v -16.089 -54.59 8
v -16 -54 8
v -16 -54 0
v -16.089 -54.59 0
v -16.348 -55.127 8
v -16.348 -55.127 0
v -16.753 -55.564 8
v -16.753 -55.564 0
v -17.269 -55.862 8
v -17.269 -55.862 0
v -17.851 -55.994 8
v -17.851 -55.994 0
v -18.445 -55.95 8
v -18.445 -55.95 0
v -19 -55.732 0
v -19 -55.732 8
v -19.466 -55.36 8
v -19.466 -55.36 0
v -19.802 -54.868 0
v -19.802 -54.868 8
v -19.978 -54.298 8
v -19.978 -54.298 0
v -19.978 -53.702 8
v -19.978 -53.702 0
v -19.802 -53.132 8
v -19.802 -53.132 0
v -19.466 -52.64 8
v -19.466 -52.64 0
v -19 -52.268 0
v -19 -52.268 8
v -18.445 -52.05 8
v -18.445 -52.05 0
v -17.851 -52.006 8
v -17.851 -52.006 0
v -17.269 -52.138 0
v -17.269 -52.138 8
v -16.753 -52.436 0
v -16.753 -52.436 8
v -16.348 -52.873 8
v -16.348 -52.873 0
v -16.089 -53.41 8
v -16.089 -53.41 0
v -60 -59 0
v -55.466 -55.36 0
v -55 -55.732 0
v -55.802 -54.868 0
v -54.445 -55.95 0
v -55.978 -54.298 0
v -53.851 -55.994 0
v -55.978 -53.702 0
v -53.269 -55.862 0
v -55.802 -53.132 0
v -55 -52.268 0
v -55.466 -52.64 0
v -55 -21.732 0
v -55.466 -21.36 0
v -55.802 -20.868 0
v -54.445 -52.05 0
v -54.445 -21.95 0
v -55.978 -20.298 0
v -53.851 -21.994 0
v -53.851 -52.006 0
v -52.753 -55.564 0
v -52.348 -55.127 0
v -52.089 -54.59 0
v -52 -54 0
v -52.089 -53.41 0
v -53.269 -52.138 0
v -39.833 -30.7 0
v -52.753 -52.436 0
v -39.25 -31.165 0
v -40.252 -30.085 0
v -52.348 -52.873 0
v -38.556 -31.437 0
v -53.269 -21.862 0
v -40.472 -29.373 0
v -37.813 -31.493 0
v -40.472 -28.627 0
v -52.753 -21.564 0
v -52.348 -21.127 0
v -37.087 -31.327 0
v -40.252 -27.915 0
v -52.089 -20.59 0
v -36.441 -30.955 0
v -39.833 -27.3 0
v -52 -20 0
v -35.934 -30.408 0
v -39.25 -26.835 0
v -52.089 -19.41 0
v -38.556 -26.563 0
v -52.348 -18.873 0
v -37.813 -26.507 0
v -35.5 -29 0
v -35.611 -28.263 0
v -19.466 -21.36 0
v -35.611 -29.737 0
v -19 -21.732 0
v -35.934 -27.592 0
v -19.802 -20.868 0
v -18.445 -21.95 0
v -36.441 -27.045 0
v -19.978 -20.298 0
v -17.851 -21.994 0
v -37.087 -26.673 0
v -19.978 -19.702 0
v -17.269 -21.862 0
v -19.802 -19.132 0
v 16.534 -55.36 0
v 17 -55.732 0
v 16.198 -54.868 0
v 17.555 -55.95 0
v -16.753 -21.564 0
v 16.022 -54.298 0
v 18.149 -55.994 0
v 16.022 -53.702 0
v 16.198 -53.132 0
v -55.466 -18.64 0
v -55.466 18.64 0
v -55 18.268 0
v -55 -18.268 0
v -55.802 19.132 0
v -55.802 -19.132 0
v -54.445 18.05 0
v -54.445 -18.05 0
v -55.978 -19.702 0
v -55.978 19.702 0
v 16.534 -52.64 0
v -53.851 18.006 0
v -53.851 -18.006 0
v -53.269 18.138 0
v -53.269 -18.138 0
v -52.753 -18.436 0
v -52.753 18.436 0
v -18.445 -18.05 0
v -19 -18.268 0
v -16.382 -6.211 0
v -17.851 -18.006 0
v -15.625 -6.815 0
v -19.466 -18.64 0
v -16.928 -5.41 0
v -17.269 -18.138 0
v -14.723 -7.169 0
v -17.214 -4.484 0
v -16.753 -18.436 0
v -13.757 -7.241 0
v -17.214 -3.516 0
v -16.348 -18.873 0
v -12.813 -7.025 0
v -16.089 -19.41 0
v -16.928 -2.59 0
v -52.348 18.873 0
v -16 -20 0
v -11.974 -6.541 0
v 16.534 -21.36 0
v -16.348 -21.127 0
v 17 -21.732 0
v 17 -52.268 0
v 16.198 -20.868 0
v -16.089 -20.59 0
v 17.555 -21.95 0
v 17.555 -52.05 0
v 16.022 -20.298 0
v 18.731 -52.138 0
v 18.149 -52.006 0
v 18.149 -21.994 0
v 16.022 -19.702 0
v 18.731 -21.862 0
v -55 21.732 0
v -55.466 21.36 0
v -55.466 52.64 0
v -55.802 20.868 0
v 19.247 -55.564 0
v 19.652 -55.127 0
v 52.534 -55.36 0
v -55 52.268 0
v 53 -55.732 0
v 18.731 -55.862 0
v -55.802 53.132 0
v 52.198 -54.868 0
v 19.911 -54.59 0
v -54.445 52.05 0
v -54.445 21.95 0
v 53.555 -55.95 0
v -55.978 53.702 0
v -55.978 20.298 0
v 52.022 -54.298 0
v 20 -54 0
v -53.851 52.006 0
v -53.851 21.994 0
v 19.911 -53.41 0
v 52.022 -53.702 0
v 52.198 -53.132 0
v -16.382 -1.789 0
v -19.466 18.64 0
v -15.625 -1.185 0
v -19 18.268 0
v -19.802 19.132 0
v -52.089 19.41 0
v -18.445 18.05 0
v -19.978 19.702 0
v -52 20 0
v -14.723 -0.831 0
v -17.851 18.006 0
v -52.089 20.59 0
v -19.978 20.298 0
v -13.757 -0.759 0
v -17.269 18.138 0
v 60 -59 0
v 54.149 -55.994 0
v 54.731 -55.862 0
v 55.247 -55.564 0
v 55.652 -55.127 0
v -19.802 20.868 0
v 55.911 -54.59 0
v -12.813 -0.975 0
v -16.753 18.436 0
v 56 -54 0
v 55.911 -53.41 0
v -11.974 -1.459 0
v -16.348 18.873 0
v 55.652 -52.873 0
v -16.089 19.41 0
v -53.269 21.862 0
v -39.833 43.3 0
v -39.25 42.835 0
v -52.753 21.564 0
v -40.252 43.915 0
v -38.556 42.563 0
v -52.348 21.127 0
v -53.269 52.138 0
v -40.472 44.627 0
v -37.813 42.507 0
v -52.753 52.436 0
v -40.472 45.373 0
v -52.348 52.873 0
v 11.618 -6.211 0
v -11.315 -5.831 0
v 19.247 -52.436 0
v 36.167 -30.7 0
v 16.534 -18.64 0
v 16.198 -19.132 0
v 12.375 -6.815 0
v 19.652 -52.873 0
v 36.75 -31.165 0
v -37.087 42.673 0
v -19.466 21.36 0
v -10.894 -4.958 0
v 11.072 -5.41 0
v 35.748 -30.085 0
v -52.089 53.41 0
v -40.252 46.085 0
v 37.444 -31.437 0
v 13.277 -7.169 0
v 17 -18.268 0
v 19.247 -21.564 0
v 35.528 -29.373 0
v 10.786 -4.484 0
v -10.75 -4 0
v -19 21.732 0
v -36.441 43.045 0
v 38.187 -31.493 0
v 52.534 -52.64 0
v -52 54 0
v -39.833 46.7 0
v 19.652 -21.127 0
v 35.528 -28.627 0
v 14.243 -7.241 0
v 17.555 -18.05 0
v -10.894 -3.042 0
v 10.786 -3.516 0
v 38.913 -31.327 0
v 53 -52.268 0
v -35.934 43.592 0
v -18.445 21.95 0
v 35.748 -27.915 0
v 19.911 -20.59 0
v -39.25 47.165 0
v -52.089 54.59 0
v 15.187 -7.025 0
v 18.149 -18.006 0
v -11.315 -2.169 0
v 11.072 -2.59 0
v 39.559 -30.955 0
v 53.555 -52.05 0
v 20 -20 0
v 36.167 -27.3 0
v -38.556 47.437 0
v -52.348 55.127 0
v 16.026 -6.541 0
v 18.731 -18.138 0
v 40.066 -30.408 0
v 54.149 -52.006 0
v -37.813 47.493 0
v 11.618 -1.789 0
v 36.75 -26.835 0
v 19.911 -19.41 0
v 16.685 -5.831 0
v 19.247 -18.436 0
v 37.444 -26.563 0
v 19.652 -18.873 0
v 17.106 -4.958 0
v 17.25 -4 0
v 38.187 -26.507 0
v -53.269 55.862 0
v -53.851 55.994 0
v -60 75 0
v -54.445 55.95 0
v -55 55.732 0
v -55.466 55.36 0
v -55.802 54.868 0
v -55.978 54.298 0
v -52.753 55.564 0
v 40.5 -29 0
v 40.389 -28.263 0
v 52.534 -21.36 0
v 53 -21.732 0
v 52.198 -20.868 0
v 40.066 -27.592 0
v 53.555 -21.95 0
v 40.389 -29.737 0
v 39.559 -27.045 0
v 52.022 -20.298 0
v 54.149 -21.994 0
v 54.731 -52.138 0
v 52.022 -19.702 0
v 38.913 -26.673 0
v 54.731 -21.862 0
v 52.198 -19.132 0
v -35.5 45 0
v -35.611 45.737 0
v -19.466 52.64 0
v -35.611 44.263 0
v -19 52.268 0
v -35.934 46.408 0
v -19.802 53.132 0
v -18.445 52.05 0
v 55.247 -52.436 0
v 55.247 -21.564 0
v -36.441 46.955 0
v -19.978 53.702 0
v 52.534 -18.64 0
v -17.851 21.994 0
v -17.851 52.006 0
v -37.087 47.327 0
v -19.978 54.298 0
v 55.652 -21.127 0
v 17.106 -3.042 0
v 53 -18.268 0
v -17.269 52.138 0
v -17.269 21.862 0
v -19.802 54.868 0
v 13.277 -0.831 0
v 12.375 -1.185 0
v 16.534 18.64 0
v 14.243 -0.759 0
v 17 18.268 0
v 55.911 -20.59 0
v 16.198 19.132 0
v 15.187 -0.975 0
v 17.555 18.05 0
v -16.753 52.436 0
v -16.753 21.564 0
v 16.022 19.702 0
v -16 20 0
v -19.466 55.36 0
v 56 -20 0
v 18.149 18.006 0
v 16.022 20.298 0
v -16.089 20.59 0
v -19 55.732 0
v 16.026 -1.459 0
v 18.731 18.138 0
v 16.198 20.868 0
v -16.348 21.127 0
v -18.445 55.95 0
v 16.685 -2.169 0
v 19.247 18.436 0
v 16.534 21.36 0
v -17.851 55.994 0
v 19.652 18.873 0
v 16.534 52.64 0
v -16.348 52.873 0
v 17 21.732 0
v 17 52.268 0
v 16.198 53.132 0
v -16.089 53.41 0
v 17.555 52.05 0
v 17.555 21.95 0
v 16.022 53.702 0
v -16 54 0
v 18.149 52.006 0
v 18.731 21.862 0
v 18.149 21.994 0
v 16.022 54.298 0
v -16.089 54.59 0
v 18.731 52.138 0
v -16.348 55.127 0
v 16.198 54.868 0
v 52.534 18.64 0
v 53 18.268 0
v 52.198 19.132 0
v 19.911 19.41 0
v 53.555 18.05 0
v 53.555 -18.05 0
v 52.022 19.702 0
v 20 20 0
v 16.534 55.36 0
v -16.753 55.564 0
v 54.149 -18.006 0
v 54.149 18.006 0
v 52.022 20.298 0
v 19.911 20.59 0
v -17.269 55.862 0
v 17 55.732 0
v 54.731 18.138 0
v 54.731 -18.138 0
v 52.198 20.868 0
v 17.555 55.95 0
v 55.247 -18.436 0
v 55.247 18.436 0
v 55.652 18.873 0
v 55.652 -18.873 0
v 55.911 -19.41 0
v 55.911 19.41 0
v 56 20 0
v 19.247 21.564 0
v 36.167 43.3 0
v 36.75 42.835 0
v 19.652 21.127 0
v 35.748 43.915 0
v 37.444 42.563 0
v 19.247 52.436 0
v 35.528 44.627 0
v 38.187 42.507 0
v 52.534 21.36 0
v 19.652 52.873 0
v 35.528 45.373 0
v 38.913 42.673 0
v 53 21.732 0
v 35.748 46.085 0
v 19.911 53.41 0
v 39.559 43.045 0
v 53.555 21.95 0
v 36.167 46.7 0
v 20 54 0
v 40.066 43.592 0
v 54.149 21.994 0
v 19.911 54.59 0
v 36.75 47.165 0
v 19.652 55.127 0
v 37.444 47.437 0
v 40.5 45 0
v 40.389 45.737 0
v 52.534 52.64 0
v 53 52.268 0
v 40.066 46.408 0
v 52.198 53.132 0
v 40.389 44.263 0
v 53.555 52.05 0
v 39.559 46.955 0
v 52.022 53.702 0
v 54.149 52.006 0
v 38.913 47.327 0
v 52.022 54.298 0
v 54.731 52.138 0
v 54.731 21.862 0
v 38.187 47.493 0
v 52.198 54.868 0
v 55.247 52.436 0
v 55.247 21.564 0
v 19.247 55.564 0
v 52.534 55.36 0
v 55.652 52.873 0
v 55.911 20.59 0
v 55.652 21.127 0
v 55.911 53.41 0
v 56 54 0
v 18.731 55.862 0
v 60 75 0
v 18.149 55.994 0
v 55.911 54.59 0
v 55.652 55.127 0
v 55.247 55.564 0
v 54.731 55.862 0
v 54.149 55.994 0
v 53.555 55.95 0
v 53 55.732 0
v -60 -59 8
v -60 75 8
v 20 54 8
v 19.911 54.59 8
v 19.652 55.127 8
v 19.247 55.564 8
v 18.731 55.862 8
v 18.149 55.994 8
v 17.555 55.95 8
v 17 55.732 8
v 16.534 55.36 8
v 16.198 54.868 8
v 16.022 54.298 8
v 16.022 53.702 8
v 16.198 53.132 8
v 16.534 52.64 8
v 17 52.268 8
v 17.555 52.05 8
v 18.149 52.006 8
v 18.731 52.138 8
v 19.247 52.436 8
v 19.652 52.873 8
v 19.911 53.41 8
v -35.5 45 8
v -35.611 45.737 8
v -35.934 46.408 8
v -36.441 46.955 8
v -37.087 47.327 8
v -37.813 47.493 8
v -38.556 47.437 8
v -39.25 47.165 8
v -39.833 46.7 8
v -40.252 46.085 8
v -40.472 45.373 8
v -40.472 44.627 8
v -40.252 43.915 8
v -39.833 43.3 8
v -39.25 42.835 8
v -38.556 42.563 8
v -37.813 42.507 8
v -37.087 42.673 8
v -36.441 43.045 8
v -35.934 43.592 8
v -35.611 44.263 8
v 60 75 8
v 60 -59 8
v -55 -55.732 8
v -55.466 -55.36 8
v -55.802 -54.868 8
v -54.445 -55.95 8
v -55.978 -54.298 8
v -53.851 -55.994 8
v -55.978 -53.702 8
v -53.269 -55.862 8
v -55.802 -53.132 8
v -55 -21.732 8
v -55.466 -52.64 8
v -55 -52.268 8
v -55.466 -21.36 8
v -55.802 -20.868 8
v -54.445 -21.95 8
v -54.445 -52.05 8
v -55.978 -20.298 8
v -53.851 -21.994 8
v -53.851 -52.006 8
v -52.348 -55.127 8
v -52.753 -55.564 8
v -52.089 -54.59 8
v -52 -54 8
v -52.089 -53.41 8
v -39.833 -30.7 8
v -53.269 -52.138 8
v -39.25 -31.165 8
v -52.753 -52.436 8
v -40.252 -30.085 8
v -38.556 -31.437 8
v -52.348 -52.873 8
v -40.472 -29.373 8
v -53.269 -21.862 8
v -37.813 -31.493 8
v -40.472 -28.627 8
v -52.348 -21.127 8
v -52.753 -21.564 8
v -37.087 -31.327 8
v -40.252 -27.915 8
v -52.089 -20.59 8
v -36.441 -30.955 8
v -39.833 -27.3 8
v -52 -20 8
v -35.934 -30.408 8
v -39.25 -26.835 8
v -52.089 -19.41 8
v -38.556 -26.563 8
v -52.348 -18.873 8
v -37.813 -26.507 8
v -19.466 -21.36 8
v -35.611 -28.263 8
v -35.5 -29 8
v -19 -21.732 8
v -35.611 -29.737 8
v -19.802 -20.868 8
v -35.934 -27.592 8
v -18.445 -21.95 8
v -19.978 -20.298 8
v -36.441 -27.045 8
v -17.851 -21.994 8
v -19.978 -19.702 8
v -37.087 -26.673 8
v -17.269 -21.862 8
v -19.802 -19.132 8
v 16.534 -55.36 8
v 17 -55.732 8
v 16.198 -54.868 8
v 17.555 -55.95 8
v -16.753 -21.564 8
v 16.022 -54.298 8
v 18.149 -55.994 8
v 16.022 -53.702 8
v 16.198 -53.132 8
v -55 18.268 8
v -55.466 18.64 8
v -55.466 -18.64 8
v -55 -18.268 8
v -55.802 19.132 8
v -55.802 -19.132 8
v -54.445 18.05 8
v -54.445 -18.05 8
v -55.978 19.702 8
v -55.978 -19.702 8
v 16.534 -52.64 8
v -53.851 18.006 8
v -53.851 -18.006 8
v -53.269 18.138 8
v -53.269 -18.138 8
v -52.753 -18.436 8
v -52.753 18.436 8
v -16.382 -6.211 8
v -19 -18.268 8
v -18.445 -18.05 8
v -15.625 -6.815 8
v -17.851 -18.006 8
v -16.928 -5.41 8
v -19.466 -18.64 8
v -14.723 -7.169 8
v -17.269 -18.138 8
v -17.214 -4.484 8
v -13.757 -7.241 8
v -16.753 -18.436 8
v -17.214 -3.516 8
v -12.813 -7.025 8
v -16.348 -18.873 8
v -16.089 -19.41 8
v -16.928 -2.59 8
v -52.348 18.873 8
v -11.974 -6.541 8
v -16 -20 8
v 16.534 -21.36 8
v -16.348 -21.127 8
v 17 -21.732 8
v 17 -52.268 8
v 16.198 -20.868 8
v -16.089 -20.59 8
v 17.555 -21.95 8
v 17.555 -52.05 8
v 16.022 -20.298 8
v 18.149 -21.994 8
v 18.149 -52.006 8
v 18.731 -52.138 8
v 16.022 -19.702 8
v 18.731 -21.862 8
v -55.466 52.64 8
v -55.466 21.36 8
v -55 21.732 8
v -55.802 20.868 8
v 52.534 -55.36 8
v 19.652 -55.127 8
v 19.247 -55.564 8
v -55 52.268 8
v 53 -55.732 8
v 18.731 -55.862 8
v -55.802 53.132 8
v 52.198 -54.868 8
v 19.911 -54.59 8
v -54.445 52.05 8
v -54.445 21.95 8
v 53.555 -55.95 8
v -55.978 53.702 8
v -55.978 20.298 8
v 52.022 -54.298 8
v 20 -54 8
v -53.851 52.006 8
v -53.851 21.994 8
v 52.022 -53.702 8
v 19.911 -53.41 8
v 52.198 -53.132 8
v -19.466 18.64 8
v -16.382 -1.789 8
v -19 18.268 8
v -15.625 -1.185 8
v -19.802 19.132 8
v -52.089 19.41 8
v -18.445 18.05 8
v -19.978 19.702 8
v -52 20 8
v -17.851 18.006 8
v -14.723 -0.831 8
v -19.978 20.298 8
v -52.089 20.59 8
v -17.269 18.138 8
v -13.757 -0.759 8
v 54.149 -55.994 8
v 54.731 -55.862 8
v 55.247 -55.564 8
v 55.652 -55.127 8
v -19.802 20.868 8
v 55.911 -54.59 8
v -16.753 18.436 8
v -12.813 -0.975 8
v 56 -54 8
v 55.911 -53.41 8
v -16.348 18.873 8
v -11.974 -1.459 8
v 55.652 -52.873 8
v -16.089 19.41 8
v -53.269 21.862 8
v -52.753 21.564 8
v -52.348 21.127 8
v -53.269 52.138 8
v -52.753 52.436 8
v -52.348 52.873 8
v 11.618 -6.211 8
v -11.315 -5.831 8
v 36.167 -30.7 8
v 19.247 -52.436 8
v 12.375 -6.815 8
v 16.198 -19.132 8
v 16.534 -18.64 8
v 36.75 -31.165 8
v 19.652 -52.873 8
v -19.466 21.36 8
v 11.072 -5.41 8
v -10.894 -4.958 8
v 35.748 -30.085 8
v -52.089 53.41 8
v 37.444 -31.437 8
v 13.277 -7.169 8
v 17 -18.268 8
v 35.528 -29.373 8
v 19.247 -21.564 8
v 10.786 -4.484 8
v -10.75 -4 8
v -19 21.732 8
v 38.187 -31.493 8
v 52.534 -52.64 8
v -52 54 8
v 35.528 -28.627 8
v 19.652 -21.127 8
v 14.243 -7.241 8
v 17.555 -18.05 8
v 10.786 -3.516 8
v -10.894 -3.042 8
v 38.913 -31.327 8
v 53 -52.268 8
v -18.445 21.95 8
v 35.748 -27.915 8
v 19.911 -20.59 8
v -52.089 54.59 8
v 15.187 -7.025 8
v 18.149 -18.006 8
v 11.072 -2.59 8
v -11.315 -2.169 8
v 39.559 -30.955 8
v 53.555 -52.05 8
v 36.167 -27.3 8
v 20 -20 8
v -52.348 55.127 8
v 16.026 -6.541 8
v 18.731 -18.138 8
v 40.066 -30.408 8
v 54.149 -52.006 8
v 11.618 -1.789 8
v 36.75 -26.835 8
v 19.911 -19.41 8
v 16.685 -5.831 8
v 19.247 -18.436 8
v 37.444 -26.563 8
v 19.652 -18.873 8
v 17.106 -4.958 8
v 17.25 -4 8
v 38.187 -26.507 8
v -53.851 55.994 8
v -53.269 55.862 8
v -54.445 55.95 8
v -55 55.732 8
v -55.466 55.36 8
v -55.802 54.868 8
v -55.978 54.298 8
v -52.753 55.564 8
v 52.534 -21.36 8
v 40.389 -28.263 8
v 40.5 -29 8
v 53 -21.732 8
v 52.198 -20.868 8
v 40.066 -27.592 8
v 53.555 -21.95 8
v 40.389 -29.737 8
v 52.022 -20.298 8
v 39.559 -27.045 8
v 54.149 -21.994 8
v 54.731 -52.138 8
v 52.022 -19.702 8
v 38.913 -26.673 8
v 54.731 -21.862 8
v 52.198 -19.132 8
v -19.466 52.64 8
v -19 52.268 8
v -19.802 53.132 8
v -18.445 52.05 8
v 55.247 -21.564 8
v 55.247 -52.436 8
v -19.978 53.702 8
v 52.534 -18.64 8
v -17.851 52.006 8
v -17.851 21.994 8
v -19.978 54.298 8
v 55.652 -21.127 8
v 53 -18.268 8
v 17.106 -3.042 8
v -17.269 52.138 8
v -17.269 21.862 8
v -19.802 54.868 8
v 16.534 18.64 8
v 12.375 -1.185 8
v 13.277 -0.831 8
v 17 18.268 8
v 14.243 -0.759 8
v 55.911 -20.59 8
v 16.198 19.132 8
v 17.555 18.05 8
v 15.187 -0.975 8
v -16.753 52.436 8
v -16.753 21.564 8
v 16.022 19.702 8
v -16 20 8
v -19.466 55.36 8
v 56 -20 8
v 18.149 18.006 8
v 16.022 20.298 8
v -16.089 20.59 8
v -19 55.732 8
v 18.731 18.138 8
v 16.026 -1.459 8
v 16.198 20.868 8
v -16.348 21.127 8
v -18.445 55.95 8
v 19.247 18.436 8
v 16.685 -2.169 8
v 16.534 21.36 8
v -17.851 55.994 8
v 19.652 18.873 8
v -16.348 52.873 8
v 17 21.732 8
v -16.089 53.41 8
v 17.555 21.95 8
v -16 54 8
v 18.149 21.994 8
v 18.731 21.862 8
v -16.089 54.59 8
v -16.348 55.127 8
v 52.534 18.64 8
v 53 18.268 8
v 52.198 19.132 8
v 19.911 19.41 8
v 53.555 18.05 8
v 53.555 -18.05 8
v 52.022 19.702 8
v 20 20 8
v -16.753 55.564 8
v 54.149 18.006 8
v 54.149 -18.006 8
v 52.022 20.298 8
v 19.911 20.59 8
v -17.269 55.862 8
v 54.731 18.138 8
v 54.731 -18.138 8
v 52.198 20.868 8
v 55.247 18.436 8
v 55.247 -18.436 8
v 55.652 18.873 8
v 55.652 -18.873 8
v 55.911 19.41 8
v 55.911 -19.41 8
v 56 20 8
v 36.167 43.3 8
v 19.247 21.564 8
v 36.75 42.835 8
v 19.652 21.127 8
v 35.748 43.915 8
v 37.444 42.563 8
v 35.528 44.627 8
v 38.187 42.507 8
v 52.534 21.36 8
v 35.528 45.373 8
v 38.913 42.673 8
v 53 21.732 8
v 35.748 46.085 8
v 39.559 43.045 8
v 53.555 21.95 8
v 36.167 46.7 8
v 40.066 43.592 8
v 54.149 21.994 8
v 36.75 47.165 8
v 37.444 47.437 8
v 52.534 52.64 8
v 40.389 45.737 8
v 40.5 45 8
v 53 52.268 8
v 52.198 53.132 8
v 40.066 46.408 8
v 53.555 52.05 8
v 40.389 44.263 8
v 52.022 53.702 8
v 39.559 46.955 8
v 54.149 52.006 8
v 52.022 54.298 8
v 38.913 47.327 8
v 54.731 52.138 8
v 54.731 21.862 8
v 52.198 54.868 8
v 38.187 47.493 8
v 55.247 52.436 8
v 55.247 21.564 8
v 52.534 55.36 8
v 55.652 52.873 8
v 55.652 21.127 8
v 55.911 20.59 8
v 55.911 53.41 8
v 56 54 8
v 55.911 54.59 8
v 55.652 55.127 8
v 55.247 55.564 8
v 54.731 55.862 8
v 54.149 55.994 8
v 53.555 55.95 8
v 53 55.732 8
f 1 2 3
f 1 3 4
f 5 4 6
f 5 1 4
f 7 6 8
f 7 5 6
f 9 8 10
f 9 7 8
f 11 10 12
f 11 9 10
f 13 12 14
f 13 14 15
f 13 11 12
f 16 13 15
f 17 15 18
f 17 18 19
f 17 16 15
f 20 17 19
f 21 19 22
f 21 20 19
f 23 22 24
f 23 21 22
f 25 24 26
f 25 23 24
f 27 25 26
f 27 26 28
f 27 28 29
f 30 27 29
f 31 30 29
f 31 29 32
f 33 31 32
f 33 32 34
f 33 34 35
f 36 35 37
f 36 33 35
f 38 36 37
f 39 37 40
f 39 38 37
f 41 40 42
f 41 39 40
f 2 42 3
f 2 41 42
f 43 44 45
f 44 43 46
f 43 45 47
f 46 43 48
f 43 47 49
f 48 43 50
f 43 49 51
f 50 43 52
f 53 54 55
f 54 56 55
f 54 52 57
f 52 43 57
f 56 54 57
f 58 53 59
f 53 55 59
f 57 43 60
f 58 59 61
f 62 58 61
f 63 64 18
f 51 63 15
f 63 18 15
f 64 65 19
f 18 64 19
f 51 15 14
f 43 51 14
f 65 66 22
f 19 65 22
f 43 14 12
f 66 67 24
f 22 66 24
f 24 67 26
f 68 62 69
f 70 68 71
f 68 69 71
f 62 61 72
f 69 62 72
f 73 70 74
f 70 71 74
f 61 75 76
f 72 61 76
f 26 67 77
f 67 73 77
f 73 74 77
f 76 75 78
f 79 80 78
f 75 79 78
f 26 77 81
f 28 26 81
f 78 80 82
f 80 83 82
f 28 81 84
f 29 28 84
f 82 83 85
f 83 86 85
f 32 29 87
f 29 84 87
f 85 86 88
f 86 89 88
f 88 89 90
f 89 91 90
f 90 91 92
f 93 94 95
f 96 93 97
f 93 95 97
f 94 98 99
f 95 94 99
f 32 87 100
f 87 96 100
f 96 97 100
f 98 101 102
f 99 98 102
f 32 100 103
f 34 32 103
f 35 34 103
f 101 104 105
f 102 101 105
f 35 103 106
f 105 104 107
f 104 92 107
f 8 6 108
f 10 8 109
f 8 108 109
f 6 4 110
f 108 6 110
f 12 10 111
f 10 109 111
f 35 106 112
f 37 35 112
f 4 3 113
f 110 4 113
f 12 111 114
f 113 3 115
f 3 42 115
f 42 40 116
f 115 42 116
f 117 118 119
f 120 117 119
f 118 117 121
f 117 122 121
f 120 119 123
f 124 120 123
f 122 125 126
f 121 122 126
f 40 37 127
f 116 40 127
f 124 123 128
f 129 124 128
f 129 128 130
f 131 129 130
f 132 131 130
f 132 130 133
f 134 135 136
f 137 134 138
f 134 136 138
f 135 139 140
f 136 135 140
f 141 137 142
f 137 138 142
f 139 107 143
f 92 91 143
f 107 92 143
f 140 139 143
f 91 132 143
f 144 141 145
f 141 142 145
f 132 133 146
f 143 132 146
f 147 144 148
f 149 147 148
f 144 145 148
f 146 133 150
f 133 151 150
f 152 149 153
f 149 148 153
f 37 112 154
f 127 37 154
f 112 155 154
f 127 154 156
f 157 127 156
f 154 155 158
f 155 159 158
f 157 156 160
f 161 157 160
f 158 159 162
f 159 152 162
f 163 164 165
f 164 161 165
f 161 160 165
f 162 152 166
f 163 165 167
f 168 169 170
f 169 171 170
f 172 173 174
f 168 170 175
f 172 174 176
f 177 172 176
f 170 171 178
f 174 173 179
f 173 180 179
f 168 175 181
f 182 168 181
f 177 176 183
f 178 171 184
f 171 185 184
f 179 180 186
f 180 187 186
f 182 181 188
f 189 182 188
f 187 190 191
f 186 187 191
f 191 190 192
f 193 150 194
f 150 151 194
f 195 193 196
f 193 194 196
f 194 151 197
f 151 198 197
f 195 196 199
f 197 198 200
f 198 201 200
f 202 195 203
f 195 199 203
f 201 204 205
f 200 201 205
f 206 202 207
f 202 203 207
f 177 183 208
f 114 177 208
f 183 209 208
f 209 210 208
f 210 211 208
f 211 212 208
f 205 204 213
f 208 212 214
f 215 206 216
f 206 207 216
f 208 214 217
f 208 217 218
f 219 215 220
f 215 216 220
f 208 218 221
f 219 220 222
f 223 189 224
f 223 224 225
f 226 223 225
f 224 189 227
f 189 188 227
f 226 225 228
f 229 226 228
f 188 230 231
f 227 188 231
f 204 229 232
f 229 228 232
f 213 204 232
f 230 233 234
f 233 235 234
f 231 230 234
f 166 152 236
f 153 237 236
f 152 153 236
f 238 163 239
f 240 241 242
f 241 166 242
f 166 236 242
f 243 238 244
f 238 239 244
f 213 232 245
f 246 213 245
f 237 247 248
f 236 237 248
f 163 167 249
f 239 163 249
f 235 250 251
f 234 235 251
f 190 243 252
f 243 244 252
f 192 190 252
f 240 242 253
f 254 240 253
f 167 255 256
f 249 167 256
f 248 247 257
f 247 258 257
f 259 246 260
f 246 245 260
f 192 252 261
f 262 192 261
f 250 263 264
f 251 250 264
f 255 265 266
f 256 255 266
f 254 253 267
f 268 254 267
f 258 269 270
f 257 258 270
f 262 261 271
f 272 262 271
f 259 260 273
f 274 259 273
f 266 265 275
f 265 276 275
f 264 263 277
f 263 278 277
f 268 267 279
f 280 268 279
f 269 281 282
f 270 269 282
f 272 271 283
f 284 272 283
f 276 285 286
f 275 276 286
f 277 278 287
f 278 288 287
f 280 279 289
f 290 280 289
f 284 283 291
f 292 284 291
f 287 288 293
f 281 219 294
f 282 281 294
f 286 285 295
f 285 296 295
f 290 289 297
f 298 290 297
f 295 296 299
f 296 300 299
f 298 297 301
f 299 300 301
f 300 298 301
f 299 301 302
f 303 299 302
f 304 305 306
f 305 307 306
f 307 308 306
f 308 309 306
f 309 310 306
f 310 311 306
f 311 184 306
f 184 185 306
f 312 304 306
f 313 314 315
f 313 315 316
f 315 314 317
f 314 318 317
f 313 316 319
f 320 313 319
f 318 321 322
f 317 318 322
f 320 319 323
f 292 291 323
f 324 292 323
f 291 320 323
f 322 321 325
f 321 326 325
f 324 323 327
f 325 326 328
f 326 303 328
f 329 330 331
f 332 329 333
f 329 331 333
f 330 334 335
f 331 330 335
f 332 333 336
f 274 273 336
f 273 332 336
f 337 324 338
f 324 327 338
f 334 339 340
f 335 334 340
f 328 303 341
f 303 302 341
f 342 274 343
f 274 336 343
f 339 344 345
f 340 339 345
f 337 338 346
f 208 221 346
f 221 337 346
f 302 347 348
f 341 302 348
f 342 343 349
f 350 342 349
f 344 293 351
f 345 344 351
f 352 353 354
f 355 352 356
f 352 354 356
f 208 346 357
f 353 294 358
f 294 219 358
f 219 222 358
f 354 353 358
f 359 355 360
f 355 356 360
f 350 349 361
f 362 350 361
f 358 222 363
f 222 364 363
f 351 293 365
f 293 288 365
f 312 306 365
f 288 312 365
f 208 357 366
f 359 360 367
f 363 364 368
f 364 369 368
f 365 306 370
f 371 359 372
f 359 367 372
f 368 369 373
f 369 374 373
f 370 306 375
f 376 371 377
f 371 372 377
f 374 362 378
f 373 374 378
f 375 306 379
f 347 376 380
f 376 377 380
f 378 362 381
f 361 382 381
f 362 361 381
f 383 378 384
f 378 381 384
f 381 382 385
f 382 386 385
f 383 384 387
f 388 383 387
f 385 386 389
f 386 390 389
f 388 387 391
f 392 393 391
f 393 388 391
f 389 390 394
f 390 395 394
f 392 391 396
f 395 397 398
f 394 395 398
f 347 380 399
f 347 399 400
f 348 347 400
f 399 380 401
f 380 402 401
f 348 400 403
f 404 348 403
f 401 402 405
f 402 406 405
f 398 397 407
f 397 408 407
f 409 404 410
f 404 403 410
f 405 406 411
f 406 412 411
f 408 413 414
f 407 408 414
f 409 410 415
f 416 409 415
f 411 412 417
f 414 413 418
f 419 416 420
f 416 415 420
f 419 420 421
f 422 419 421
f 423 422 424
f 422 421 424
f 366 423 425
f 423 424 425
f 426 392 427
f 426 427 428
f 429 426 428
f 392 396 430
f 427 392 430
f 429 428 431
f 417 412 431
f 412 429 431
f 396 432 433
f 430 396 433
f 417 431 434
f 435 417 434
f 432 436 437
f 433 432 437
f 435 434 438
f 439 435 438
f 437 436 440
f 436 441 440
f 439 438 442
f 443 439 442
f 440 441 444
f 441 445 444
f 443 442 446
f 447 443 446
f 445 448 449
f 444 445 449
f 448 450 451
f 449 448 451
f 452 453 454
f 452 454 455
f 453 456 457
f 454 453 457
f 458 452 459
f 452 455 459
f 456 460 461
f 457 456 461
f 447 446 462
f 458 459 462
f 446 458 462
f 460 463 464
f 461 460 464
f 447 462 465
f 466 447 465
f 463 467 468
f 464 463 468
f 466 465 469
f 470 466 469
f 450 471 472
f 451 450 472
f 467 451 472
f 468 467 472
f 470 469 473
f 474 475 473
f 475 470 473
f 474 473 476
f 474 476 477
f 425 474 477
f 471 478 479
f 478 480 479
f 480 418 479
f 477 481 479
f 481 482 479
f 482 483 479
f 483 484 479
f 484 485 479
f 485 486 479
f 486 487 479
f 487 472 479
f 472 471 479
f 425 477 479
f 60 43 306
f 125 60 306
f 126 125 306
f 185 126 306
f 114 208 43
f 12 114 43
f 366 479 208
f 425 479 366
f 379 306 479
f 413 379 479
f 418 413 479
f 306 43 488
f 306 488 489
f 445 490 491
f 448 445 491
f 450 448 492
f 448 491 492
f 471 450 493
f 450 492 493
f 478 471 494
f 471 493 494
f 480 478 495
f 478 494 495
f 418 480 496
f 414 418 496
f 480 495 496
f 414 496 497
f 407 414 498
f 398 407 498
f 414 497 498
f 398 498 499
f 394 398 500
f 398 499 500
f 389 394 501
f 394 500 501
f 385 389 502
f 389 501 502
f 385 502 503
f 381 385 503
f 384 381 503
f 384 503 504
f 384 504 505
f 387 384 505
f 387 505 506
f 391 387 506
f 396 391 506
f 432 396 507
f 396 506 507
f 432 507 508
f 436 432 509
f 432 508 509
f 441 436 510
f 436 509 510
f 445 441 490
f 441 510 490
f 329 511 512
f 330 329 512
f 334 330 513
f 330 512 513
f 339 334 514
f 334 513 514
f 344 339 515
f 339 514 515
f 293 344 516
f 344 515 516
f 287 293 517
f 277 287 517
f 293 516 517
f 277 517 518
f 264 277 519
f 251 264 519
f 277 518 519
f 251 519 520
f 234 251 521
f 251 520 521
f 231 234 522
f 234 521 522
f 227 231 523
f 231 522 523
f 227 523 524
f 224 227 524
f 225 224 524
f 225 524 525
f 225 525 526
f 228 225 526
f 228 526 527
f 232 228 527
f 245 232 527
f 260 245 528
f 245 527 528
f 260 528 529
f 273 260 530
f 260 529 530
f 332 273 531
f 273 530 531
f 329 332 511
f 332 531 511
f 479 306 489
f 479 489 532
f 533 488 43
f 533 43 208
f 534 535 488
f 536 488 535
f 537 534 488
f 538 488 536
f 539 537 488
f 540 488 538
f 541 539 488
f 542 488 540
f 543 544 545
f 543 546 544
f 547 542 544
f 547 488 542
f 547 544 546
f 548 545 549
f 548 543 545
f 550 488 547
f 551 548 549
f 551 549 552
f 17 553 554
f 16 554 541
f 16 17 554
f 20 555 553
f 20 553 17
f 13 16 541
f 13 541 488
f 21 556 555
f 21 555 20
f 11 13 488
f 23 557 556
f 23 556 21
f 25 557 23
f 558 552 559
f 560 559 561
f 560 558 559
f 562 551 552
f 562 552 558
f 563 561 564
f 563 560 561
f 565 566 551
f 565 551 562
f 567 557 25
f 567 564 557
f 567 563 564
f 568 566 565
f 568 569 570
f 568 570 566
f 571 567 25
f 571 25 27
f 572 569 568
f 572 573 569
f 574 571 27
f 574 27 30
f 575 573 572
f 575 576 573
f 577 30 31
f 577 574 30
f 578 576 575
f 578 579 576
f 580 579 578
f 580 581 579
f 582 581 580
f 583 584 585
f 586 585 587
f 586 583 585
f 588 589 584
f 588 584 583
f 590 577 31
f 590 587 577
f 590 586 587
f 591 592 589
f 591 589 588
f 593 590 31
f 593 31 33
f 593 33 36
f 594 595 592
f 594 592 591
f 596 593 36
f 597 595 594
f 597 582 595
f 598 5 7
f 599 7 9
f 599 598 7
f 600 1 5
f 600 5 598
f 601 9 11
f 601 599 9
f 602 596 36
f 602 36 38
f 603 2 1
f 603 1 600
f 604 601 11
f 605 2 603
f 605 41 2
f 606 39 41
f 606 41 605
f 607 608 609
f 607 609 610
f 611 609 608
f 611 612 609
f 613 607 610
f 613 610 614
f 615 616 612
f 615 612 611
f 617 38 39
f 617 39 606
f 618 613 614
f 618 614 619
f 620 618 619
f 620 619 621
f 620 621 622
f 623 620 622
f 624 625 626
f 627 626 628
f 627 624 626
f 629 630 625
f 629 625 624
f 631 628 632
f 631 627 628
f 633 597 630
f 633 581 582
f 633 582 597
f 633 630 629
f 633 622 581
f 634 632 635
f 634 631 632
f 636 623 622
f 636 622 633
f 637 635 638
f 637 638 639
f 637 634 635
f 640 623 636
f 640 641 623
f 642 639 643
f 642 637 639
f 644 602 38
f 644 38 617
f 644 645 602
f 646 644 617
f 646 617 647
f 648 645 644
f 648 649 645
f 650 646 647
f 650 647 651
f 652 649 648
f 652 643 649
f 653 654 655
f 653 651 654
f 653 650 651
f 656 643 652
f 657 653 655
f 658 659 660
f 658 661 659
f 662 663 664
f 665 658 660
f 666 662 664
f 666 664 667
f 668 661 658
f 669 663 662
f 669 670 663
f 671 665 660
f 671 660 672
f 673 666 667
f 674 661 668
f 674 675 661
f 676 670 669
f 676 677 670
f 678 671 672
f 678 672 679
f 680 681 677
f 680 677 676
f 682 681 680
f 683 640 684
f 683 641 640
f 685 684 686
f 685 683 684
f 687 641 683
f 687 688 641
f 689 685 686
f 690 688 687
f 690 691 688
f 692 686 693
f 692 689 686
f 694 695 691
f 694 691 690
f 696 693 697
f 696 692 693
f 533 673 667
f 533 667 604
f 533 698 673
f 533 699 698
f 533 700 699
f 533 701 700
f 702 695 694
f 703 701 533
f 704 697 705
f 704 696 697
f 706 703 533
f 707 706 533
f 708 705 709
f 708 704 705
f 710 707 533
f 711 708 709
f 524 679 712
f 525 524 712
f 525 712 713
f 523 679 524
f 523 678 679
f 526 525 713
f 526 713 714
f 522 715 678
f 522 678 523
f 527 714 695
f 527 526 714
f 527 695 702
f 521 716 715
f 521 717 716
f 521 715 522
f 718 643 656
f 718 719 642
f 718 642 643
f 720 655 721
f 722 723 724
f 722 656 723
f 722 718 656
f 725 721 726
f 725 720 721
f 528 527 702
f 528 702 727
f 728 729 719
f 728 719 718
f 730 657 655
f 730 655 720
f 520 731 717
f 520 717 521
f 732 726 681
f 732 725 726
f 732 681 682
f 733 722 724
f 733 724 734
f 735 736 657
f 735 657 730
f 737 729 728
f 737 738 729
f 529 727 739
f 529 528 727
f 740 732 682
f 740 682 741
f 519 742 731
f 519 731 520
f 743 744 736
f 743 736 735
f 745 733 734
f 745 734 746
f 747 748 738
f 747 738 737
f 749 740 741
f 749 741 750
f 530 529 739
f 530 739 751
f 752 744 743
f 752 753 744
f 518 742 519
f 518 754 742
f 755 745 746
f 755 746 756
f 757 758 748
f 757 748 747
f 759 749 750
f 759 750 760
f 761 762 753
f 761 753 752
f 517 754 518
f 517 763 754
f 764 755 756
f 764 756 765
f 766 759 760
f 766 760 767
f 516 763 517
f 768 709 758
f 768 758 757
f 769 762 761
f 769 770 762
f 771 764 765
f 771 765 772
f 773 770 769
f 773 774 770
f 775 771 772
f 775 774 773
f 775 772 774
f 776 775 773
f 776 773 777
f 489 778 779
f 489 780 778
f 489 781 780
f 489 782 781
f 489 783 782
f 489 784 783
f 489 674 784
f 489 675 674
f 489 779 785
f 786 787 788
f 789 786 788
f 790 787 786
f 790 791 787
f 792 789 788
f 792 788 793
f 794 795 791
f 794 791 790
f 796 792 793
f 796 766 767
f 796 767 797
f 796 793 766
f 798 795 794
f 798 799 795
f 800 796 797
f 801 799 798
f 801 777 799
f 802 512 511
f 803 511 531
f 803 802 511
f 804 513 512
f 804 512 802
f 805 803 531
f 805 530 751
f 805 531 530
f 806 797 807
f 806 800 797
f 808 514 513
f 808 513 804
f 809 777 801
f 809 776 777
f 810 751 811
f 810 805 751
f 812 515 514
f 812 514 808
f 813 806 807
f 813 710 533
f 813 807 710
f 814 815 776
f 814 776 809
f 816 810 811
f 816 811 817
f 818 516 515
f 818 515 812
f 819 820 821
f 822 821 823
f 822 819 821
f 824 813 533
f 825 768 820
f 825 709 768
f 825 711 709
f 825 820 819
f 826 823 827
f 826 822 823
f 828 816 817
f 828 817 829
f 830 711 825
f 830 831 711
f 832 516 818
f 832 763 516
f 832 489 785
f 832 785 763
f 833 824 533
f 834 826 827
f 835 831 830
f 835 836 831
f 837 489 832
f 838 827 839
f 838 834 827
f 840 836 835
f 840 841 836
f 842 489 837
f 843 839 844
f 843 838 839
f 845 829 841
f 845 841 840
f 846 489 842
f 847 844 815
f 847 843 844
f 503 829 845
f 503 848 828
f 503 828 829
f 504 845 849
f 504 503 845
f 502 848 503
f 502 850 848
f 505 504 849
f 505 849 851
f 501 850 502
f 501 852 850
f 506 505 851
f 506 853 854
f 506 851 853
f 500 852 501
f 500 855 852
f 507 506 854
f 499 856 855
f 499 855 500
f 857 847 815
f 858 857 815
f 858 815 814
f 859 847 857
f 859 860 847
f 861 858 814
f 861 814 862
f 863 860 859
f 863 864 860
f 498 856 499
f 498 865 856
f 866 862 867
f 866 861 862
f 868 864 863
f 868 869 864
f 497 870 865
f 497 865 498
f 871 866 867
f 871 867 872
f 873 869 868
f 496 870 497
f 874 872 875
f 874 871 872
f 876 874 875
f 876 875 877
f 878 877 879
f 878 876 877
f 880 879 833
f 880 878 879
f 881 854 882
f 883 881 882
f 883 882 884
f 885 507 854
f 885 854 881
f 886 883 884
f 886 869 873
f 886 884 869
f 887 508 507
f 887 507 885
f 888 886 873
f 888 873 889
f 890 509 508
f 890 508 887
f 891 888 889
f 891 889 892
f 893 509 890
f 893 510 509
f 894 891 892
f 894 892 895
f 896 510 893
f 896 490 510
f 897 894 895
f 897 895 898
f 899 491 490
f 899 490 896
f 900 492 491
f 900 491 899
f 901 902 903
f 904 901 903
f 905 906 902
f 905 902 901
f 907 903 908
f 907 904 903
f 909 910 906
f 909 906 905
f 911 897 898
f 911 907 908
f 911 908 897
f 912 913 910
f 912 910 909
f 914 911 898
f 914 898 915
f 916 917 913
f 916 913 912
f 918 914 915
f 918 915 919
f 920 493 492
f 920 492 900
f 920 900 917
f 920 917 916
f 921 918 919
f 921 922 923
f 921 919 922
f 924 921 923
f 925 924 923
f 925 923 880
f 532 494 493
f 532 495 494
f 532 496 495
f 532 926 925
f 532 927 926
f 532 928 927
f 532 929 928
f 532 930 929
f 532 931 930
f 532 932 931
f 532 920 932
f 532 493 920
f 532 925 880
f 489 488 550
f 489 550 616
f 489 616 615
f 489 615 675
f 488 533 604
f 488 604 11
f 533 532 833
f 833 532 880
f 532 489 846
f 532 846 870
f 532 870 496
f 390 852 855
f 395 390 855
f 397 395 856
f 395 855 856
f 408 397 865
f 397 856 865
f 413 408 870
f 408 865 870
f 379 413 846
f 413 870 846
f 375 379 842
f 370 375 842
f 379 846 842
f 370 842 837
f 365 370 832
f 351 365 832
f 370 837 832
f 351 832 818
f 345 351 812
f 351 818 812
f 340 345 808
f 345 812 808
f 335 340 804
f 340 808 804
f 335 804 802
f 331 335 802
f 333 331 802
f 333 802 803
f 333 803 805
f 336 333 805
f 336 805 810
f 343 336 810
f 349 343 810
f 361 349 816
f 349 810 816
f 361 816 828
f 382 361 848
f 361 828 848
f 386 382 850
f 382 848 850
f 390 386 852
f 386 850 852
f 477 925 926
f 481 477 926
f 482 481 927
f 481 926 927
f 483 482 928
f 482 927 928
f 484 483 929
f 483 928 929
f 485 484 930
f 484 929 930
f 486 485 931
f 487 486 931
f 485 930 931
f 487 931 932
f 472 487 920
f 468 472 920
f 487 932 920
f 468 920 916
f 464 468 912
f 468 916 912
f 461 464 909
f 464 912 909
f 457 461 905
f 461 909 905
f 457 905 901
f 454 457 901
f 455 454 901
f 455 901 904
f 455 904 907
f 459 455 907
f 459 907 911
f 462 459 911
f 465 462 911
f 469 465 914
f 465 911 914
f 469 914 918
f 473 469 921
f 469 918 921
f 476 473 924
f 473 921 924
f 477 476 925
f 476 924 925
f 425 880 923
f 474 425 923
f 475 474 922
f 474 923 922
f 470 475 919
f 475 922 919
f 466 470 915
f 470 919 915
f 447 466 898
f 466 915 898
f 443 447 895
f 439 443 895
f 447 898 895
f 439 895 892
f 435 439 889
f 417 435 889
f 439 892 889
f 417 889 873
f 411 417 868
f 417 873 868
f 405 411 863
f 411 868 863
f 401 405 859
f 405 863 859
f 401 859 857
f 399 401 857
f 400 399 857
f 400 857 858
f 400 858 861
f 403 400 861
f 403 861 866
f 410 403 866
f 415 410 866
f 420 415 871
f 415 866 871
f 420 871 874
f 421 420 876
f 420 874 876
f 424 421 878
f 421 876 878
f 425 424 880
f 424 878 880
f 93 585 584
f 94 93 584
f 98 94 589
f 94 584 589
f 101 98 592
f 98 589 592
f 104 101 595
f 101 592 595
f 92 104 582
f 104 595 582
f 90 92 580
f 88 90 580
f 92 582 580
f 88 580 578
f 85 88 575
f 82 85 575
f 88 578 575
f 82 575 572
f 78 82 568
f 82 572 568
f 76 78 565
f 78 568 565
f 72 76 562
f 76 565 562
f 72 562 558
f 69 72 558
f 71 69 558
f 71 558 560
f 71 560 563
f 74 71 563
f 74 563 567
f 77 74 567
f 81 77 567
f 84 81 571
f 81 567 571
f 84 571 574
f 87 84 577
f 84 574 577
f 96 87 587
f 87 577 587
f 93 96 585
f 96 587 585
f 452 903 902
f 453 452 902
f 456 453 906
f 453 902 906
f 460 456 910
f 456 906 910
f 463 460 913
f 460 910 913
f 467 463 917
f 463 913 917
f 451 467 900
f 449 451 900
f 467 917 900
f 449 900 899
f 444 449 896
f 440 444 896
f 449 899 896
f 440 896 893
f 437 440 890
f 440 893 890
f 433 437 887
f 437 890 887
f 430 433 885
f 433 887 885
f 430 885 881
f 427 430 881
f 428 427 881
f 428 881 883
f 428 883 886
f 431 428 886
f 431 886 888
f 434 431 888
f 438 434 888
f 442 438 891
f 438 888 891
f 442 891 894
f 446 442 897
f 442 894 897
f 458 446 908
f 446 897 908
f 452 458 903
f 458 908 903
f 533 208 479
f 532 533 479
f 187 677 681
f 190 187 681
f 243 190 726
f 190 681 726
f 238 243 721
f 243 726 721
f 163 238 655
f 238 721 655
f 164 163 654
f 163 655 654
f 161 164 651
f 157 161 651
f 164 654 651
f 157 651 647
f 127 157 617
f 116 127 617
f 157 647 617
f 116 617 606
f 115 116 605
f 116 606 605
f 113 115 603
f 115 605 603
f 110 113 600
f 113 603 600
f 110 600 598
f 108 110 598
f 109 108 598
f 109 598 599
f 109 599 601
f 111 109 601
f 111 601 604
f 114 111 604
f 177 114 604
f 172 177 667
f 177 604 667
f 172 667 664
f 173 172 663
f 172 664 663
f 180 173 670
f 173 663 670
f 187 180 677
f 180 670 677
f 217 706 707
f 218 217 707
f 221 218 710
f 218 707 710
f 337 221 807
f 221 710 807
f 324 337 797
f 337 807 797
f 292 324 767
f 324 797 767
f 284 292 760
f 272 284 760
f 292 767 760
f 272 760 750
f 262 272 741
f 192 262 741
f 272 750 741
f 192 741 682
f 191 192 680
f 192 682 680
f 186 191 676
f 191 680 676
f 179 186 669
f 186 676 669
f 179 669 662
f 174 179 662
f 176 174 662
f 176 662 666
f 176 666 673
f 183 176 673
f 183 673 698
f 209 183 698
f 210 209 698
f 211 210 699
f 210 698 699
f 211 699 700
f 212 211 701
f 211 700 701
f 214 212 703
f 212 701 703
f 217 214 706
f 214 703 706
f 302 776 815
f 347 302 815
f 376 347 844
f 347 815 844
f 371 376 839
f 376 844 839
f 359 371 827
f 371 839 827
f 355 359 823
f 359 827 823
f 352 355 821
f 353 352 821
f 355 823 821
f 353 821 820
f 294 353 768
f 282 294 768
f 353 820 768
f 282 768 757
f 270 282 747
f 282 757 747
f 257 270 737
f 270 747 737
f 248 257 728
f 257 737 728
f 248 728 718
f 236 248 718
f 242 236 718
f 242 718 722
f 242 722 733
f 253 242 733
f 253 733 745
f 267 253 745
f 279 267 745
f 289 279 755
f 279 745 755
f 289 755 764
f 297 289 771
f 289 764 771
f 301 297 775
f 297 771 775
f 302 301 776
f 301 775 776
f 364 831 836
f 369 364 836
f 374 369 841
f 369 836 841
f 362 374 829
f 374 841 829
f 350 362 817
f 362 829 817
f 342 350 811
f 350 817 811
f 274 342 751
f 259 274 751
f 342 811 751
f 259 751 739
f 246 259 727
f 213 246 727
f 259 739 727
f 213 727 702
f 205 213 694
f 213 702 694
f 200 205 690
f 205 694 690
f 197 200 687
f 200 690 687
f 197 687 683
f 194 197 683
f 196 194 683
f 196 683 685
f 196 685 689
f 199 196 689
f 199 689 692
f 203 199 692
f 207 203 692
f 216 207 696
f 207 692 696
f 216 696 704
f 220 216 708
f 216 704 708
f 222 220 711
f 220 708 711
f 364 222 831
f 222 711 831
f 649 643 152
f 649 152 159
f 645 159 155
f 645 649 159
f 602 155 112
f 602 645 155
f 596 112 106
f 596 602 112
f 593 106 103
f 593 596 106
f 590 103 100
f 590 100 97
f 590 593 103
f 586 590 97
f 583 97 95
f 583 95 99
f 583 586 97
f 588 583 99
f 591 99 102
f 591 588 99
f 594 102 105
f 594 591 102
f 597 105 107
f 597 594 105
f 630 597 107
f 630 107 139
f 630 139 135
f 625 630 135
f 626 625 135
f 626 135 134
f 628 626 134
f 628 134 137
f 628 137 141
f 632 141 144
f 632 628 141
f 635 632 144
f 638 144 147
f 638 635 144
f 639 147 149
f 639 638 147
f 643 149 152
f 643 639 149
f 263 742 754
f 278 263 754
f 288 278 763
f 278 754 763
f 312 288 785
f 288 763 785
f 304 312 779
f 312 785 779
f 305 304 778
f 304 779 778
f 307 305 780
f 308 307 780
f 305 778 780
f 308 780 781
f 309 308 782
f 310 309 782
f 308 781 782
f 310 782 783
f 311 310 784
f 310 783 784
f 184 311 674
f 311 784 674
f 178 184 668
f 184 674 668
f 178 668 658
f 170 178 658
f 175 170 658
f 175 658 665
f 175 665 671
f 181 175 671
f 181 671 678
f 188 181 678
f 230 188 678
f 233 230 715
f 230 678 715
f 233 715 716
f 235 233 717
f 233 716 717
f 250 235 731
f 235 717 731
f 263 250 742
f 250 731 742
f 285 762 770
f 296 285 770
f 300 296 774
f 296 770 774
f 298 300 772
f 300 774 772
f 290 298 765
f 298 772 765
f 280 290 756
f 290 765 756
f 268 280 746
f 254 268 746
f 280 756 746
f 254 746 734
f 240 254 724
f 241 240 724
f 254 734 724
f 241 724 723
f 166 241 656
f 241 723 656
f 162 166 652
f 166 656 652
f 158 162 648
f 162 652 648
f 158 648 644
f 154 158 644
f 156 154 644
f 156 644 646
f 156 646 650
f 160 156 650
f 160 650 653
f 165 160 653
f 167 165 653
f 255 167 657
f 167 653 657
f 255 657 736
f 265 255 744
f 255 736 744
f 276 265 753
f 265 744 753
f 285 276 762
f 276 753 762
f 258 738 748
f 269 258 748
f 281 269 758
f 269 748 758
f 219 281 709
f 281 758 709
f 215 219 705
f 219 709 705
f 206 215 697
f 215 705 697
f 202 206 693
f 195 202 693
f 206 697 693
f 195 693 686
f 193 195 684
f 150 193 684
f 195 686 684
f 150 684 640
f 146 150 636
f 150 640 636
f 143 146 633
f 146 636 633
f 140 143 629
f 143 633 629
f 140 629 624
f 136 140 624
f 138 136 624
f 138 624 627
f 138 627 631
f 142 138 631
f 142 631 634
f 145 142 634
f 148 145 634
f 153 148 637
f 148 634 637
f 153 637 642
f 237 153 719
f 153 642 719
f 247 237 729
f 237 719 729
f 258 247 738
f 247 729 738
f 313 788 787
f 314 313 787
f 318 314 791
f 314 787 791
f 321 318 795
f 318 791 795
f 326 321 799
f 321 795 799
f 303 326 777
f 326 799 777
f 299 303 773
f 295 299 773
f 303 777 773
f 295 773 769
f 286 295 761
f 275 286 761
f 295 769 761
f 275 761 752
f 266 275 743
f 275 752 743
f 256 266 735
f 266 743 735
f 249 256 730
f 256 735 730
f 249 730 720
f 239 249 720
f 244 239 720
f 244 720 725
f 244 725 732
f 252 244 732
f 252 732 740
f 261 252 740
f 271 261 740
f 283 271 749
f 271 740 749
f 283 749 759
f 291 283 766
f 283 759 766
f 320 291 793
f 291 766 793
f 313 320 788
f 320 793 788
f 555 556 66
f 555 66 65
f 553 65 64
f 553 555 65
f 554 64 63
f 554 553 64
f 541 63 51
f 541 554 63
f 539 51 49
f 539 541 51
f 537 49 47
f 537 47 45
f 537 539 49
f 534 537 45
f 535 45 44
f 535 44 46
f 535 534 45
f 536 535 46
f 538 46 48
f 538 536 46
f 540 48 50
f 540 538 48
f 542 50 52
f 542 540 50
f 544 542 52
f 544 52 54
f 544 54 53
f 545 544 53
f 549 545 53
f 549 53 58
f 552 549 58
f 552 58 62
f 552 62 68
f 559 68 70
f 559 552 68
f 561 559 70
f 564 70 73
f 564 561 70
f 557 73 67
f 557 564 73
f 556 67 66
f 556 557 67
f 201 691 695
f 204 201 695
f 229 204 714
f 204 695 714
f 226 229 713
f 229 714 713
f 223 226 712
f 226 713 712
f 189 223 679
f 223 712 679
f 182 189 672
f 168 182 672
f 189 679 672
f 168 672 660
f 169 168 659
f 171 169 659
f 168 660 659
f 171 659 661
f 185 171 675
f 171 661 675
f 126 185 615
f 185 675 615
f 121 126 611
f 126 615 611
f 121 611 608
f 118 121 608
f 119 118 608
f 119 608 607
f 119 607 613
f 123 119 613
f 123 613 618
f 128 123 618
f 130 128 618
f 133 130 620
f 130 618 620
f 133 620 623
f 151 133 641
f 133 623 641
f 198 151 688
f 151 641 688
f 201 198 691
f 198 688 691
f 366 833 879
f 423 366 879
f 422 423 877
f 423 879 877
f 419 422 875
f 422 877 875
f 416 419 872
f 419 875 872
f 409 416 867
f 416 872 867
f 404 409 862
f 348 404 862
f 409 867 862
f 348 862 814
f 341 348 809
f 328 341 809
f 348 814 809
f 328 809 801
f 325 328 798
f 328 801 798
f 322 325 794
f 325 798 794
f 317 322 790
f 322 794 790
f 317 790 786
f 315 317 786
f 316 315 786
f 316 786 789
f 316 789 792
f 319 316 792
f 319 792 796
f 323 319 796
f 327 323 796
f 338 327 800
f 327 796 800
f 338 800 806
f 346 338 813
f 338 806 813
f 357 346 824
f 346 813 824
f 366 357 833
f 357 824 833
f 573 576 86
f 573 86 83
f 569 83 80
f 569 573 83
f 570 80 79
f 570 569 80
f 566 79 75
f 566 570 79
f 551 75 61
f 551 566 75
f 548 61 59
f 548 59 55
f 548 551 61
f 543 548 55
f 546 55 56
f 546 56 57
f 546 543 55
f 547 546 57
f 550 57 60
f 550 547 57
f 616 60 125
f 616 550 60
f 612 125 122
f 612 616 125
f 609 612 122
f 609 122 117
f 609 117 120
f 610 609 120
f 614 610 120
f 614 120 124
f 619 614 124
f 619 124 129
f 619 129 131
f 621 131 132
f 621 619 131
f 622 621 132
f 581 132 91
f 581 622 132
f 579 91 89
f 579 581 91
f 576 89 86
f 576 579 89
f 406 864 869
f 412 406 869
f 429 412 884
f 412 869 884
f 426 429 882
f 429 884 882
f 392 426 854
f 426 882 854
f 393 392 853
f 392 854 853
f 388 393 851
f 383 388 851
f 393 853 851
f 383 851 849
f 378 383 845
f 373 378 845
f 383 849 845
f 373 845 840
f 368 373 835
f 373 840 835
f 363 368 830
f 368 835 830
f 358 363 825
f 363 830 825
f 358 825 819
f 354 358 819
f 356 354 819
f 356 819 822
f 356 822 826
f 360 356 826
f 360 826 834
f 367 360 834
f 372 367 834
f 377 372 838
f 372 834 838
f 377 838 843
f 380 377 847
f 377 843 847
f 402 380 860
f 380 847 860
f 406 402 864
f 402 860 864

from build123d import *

# Parameters (mm, degrees)
F0_W             = 120
F0_H             = 150
F1_DEPTH         = 8
F2_R             = 2
F3_DEPTH         = 8
F3_COPIES_COUNT  = 3
F3_COPIES_PITCH  = 36
F3_COPIES2_COUNT = 2
F3_COPIES2_PITCH = 103.247276
F4_R             = 3.25
F4_W             = 120
F4_H             = 16
F4_R_2           = 2.5
F5_DEPTH         = 8


# Not quite as in the source:
# - a pattern or mirror of a feature is missing from the dataset's text; its kind, count and spacing are read off the source's solid


with BuildPart() as f1:
    # F0 (on Top) → F1 (new body)
    with BuildSketch(Plane.XY):
        Rectangle(F0_W, F0_H)
    extrude(amount=F1_DEPTH)

    # F2 (on face) → F3 (cut, through all)
    with BuildSketch(Plane.XY.offset(8)):
        with Locations((-54, 54)):
            Circle(F2_R)
        with Locations((-18, 54)):
            Circle(F2_R)
        with Locations((-18, 20)):
            Circle(F2_R)
        with Locations((-54, 20)):
            Circle(F2_R)
    f3 = extrude(amount=-F3_DEPTH, mode=Mode.SUBTRACT)

    # F3_copies: F3 ×3
    with Locations(*[(i * F3_COPIES_PITCH, 0, 0) for i in range(1, F3_COPIES_COUNT)]):
        add(f3, mode=Mode.SUBTRACT)

    # F3_copies1: F3 across plane
    add(f3.mirror(Plane(origin=(0, 0, 0), x_dir=(0, 0, -1), z_dir=(0, -1, 0))), mode=Mode.SUBTRACT)

    # F3_copies2: F3 ×2
    with Locations(*[Vector(0.6973549598, -0.7167259309, 0) * (i * F3_COPIES2_PITCH) for i in range(1, F3_COPIES2_COUNT)]):
        add(f3, mode=Mode.SUBTRACT)

    # F4 (on face) → F5 (cut, through all)
    with BuildSketch(Plane.XY.offset(8)):
        with Locations((-14, -4)):
            Circle(F4_R)
        with Locations((14, -4)):
            Circle(F4_R)
        with Locations((0, -67)):
            Rectangle(F4_W, F4_H)
        with Locations((38, -29)):
            Circle(F4_R_2)
        with Locations((38, 45)):
            Circle(F4_R_2)
        with Locations((-38, 45)):
            Circle(F4_R_2)
        with Locations((-38, -29)):
            Circle(F4_R_2)
    extrude(amount=-F5_DEPTH, mode=Mode.SUBTRACT)


solid = f1.part
